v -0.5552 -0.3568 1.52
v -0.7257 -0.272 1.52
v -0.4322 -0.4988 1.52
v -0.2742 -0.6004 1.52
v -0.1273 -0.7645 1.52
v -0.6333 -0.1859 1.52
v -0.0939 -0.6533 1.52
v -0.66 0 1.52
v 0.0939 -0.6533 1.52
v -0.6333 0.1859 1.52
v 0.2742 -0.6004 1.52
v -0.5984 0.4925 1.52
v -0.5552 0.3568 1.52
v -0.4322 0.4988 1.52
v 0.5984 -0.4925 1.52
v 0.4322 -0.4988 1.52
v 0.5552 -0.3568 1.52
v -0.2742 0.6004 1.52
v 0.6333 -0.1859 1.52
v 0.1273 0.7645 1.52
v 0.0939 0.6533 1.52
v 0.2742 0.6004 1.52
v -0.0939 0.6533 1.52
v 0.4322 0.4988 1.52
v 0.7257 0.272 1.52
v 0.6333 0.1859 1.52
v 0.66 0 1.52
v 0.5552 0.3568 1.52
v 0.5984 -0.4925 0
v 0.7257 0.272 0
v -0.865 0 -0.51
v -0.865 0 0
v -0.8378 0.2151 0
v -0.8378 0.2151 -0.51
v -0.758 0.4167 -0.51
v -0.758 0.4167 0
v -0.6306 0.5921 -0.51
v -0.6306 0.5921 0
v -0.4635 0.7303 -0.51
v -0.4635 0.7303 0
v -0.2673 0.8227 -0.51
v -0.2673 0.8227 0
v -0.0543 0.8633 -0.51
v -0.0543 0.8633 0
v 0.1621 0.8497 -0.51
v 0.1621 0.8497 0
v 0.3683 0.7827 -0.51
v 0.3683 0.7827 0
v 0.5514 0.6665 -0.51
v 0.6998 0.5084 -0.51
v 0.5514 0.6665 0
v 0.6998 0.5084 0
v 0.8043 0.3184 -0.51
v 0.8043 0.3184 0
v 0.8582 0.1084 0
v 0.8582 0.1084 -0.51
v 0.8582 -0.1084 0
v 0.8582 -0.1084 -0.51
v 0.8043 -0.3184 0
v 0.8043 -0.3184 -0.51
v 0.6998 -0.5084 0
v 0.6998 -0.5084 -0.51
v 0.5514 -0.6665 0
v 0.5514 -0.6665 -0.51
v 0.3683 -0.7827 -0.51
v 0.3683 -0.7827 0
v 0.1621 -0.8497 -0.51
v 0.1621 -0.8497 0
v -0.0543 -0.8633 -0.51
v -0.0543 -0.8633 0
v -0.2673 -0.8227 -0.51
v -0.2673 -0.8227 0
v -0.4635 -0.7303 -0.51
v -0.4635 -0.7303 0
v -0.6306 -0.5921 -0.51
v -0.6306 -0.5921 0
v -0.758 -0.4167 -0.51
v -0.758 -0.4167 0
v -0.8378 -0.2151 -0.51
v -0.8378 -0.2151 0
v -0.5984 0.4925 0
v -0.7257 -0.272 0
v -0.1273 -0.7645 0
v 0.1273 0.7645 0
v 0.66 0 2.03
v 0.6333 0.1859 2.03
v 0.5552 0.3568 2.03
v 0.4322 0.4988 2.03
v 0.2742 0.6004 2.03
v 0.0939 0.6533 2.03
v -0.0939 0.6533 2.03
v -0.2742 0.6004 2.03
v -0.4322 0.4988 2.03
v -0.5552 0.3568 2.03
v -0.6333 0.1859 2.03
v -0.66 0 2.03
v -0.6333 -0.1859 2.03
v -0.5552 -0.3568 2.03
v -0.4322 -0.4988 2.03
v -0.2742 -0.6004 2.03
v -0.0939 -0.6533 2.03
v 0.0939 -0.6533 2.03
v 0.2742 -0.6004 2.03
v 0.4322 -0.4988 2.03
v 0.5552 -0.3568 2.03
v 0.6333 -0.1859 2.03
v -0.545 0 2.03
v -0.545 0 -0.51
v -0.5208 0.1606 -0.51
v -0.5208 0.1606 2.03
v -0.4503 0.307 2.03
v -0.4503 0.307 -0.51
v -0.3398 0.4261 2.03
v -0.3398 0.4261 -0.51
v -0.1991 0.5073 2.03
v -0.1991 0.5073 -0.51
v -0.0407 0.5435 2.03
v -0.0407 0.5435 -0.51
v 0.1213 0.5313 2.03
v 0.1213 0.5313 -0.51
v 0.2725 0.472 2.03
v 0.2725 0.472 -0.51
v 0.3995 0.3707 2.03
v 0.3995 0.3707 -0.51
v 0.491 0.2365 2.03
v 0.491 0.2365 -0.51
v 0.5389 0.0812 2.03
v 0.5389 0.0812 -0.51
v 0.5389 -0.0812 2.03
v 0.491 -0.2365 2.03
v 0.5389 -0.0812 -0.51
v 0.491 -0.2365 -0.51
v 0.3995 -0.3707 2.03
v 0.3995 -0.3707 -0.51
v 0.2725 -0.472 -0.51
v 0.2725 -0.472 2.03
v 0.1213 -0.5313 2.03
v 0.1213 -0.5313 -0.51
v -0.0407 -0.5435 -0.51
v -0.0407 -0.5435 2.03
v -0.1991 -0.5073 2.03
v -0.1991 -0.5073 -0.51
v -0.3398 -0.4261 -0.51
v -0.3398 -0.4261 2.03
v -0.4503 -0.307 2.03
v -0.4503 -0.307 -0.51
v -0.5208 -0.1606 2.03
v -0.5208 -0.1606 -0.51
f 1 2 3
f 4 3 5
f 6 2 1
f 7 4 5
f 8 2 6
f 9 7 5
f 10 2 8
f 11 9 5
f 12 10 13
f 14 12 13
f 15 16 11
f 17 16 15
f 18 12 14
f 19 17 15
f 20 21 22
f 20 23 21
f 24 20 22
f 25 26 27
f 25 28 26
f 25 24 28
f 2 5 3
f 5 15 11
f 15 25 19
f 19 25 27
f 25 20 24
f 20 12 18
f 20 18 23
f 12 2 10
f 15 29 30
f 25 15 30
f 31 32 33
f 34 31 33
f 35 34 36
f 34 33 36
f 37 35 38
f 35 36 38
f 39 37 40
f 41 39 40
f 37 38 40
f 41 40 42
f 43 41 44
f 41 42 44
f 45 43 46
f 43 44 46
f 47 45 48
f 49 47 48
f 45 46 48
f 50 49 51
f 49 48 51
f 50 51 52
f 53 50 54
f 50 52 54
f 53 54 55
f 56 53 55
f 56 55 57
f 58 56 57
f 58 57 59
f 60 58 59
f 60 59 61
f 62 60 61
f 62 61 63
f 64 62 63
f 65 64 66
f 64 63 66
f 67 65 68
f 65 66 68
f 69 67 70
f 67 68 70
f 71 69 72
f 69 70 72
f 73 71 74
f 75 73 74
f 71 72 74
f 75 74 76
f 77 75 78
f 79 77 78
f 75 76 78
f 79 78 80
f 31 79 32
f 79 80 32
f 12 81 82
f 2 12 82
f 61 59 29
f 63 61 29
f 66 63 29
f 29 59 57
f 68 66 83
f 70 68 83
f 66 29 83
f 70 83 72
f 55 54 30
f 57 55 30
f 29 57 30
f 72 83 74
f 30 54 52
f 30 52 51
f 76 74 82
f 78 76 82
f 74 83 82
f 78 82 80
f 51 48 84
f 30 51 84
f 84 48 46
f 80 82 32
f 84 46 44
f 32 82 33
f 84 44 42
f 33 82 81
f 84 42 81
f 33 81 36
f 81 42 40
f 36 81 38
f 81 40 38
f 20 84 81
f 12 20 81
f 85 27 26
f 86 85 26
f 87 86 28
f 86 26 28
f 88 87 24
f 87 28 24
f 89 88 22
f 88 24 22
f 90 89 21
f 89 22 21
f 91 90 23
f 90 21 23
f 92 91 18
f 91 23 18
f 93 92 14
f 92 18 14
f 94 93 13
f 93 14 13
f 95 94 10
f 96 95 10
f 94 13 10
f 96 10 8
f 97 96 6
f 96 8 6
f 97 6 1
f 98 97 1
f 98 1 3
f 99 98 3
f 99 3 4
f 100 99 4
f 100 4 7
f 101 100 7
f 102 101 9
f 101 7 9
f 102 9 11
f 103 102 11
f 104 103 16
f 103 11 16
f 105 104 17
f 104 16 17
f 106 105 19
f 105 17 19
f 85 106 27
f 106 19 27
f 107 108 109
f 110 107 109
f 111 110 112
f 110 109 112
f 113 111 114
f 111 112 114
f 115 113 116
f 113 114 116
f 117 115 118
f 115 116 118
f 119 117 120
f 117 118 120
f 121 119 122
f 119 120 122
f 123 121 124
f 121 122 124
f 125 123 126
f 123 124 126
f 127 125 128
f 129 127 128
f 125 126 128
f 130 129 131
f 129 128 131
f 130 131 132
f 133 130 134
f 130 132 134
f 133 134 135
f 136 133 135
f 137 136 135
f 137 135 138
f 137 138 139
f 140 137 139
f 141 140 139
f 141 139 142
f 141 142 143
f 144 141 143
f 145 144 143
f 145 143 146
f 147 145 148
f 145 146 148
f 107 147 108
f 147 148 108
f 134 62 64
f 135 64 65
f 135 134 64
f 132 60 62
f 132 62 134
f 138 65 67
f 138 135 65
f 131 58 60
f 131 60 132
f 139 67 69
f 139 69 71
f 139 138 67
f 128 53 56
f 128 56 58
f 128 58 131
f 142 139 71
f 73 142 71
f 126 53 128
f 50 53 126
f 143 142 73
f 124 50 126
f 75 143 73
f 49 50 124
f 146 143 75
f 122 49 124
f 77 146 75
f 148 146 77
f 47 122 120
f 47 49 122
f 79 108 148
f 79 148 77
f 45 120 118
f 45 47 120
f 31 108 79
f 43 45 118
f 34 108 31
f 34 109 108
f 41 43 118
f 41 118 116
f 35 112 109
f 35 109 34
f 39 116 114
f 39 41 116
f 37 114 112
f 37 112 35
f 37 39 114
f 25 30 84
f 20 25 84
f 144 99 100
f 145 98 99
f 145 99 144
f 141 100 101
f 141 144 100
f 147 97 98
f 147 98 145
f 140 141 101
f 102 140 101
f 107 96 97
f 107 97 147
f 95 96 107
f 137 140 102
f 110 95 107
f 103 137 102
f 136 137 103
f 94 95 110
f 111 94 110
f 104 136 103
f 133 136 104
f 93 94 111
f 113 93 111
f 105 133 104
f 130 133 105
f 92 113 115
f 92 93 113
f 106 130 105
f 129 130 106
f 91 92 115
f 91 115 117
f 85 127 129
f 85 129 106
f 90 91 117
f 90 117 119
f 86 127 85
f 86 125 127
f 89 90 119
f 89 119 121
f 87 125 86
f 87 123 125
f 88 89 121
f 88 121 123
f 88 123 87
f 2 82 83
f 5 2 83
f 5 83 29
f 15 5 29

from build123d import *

# Parameters (mm, degrees)
BOSS_EXTRUDE1_DEPTH = 1.52
SKETCH4_R           = 0.66
BOSS_EXTRUDE3_DEPTH = 0.51
SKETCH2_R           = 0.865
BOSS_EXTRUDE2_DEPTH = 0.51
SKETCH3_R           = 0.545
CUT_EXTRUDE1_DEPTH  = 2.54


with BuildPart() as part:
    # Sketch1 → Boss-Extrude1 (new body)
    with BuildSketch(Plane.XY):
        Polygon((-0.725690397, -0.272026557), (-0.12726329, -0.764479598), (0.598427107, -0.492453041), (0.725690397, 0.272026557), (0.12726329, 0.764479598), (-0.598427107, 0.492453041), align=None)
    extrude(amount=BOSS_EXTRUDE1_DEPTH)

    # Sketch4 → Boss-Extrude3 (add)
    with BuildSketch(Plane.XY.offset(1.52)):
        Circle(SKETCH4_R)
    extrude(amount=BOSS_EXTRUDE3_DEPTH)

    # Sketch2 → Boss-Extrude2 (add)
    with BuildSketch(Plane(origin=(0, 0, 0), x_dir=(-1, 0, 0), z_dir=(0, 0, -1))):
        Circle(SKETCH2_R)
    extrude(amount=BOSS_EXTRUDE2_DEPTH)

    # Sketch3 → Cut-Extrude1 (cut)
    with BuildSketch(Plane(origin=(0, 0, -0.51), x_dir=(-1, 0, 0), z_dir=(0, 0, -1))):
        Circle(SKETCH3_R)
    extrude(amount=-CUT_EXTRUDE1_DEPTH, mode=Mode.SUBTRACT)


solid = part.part
